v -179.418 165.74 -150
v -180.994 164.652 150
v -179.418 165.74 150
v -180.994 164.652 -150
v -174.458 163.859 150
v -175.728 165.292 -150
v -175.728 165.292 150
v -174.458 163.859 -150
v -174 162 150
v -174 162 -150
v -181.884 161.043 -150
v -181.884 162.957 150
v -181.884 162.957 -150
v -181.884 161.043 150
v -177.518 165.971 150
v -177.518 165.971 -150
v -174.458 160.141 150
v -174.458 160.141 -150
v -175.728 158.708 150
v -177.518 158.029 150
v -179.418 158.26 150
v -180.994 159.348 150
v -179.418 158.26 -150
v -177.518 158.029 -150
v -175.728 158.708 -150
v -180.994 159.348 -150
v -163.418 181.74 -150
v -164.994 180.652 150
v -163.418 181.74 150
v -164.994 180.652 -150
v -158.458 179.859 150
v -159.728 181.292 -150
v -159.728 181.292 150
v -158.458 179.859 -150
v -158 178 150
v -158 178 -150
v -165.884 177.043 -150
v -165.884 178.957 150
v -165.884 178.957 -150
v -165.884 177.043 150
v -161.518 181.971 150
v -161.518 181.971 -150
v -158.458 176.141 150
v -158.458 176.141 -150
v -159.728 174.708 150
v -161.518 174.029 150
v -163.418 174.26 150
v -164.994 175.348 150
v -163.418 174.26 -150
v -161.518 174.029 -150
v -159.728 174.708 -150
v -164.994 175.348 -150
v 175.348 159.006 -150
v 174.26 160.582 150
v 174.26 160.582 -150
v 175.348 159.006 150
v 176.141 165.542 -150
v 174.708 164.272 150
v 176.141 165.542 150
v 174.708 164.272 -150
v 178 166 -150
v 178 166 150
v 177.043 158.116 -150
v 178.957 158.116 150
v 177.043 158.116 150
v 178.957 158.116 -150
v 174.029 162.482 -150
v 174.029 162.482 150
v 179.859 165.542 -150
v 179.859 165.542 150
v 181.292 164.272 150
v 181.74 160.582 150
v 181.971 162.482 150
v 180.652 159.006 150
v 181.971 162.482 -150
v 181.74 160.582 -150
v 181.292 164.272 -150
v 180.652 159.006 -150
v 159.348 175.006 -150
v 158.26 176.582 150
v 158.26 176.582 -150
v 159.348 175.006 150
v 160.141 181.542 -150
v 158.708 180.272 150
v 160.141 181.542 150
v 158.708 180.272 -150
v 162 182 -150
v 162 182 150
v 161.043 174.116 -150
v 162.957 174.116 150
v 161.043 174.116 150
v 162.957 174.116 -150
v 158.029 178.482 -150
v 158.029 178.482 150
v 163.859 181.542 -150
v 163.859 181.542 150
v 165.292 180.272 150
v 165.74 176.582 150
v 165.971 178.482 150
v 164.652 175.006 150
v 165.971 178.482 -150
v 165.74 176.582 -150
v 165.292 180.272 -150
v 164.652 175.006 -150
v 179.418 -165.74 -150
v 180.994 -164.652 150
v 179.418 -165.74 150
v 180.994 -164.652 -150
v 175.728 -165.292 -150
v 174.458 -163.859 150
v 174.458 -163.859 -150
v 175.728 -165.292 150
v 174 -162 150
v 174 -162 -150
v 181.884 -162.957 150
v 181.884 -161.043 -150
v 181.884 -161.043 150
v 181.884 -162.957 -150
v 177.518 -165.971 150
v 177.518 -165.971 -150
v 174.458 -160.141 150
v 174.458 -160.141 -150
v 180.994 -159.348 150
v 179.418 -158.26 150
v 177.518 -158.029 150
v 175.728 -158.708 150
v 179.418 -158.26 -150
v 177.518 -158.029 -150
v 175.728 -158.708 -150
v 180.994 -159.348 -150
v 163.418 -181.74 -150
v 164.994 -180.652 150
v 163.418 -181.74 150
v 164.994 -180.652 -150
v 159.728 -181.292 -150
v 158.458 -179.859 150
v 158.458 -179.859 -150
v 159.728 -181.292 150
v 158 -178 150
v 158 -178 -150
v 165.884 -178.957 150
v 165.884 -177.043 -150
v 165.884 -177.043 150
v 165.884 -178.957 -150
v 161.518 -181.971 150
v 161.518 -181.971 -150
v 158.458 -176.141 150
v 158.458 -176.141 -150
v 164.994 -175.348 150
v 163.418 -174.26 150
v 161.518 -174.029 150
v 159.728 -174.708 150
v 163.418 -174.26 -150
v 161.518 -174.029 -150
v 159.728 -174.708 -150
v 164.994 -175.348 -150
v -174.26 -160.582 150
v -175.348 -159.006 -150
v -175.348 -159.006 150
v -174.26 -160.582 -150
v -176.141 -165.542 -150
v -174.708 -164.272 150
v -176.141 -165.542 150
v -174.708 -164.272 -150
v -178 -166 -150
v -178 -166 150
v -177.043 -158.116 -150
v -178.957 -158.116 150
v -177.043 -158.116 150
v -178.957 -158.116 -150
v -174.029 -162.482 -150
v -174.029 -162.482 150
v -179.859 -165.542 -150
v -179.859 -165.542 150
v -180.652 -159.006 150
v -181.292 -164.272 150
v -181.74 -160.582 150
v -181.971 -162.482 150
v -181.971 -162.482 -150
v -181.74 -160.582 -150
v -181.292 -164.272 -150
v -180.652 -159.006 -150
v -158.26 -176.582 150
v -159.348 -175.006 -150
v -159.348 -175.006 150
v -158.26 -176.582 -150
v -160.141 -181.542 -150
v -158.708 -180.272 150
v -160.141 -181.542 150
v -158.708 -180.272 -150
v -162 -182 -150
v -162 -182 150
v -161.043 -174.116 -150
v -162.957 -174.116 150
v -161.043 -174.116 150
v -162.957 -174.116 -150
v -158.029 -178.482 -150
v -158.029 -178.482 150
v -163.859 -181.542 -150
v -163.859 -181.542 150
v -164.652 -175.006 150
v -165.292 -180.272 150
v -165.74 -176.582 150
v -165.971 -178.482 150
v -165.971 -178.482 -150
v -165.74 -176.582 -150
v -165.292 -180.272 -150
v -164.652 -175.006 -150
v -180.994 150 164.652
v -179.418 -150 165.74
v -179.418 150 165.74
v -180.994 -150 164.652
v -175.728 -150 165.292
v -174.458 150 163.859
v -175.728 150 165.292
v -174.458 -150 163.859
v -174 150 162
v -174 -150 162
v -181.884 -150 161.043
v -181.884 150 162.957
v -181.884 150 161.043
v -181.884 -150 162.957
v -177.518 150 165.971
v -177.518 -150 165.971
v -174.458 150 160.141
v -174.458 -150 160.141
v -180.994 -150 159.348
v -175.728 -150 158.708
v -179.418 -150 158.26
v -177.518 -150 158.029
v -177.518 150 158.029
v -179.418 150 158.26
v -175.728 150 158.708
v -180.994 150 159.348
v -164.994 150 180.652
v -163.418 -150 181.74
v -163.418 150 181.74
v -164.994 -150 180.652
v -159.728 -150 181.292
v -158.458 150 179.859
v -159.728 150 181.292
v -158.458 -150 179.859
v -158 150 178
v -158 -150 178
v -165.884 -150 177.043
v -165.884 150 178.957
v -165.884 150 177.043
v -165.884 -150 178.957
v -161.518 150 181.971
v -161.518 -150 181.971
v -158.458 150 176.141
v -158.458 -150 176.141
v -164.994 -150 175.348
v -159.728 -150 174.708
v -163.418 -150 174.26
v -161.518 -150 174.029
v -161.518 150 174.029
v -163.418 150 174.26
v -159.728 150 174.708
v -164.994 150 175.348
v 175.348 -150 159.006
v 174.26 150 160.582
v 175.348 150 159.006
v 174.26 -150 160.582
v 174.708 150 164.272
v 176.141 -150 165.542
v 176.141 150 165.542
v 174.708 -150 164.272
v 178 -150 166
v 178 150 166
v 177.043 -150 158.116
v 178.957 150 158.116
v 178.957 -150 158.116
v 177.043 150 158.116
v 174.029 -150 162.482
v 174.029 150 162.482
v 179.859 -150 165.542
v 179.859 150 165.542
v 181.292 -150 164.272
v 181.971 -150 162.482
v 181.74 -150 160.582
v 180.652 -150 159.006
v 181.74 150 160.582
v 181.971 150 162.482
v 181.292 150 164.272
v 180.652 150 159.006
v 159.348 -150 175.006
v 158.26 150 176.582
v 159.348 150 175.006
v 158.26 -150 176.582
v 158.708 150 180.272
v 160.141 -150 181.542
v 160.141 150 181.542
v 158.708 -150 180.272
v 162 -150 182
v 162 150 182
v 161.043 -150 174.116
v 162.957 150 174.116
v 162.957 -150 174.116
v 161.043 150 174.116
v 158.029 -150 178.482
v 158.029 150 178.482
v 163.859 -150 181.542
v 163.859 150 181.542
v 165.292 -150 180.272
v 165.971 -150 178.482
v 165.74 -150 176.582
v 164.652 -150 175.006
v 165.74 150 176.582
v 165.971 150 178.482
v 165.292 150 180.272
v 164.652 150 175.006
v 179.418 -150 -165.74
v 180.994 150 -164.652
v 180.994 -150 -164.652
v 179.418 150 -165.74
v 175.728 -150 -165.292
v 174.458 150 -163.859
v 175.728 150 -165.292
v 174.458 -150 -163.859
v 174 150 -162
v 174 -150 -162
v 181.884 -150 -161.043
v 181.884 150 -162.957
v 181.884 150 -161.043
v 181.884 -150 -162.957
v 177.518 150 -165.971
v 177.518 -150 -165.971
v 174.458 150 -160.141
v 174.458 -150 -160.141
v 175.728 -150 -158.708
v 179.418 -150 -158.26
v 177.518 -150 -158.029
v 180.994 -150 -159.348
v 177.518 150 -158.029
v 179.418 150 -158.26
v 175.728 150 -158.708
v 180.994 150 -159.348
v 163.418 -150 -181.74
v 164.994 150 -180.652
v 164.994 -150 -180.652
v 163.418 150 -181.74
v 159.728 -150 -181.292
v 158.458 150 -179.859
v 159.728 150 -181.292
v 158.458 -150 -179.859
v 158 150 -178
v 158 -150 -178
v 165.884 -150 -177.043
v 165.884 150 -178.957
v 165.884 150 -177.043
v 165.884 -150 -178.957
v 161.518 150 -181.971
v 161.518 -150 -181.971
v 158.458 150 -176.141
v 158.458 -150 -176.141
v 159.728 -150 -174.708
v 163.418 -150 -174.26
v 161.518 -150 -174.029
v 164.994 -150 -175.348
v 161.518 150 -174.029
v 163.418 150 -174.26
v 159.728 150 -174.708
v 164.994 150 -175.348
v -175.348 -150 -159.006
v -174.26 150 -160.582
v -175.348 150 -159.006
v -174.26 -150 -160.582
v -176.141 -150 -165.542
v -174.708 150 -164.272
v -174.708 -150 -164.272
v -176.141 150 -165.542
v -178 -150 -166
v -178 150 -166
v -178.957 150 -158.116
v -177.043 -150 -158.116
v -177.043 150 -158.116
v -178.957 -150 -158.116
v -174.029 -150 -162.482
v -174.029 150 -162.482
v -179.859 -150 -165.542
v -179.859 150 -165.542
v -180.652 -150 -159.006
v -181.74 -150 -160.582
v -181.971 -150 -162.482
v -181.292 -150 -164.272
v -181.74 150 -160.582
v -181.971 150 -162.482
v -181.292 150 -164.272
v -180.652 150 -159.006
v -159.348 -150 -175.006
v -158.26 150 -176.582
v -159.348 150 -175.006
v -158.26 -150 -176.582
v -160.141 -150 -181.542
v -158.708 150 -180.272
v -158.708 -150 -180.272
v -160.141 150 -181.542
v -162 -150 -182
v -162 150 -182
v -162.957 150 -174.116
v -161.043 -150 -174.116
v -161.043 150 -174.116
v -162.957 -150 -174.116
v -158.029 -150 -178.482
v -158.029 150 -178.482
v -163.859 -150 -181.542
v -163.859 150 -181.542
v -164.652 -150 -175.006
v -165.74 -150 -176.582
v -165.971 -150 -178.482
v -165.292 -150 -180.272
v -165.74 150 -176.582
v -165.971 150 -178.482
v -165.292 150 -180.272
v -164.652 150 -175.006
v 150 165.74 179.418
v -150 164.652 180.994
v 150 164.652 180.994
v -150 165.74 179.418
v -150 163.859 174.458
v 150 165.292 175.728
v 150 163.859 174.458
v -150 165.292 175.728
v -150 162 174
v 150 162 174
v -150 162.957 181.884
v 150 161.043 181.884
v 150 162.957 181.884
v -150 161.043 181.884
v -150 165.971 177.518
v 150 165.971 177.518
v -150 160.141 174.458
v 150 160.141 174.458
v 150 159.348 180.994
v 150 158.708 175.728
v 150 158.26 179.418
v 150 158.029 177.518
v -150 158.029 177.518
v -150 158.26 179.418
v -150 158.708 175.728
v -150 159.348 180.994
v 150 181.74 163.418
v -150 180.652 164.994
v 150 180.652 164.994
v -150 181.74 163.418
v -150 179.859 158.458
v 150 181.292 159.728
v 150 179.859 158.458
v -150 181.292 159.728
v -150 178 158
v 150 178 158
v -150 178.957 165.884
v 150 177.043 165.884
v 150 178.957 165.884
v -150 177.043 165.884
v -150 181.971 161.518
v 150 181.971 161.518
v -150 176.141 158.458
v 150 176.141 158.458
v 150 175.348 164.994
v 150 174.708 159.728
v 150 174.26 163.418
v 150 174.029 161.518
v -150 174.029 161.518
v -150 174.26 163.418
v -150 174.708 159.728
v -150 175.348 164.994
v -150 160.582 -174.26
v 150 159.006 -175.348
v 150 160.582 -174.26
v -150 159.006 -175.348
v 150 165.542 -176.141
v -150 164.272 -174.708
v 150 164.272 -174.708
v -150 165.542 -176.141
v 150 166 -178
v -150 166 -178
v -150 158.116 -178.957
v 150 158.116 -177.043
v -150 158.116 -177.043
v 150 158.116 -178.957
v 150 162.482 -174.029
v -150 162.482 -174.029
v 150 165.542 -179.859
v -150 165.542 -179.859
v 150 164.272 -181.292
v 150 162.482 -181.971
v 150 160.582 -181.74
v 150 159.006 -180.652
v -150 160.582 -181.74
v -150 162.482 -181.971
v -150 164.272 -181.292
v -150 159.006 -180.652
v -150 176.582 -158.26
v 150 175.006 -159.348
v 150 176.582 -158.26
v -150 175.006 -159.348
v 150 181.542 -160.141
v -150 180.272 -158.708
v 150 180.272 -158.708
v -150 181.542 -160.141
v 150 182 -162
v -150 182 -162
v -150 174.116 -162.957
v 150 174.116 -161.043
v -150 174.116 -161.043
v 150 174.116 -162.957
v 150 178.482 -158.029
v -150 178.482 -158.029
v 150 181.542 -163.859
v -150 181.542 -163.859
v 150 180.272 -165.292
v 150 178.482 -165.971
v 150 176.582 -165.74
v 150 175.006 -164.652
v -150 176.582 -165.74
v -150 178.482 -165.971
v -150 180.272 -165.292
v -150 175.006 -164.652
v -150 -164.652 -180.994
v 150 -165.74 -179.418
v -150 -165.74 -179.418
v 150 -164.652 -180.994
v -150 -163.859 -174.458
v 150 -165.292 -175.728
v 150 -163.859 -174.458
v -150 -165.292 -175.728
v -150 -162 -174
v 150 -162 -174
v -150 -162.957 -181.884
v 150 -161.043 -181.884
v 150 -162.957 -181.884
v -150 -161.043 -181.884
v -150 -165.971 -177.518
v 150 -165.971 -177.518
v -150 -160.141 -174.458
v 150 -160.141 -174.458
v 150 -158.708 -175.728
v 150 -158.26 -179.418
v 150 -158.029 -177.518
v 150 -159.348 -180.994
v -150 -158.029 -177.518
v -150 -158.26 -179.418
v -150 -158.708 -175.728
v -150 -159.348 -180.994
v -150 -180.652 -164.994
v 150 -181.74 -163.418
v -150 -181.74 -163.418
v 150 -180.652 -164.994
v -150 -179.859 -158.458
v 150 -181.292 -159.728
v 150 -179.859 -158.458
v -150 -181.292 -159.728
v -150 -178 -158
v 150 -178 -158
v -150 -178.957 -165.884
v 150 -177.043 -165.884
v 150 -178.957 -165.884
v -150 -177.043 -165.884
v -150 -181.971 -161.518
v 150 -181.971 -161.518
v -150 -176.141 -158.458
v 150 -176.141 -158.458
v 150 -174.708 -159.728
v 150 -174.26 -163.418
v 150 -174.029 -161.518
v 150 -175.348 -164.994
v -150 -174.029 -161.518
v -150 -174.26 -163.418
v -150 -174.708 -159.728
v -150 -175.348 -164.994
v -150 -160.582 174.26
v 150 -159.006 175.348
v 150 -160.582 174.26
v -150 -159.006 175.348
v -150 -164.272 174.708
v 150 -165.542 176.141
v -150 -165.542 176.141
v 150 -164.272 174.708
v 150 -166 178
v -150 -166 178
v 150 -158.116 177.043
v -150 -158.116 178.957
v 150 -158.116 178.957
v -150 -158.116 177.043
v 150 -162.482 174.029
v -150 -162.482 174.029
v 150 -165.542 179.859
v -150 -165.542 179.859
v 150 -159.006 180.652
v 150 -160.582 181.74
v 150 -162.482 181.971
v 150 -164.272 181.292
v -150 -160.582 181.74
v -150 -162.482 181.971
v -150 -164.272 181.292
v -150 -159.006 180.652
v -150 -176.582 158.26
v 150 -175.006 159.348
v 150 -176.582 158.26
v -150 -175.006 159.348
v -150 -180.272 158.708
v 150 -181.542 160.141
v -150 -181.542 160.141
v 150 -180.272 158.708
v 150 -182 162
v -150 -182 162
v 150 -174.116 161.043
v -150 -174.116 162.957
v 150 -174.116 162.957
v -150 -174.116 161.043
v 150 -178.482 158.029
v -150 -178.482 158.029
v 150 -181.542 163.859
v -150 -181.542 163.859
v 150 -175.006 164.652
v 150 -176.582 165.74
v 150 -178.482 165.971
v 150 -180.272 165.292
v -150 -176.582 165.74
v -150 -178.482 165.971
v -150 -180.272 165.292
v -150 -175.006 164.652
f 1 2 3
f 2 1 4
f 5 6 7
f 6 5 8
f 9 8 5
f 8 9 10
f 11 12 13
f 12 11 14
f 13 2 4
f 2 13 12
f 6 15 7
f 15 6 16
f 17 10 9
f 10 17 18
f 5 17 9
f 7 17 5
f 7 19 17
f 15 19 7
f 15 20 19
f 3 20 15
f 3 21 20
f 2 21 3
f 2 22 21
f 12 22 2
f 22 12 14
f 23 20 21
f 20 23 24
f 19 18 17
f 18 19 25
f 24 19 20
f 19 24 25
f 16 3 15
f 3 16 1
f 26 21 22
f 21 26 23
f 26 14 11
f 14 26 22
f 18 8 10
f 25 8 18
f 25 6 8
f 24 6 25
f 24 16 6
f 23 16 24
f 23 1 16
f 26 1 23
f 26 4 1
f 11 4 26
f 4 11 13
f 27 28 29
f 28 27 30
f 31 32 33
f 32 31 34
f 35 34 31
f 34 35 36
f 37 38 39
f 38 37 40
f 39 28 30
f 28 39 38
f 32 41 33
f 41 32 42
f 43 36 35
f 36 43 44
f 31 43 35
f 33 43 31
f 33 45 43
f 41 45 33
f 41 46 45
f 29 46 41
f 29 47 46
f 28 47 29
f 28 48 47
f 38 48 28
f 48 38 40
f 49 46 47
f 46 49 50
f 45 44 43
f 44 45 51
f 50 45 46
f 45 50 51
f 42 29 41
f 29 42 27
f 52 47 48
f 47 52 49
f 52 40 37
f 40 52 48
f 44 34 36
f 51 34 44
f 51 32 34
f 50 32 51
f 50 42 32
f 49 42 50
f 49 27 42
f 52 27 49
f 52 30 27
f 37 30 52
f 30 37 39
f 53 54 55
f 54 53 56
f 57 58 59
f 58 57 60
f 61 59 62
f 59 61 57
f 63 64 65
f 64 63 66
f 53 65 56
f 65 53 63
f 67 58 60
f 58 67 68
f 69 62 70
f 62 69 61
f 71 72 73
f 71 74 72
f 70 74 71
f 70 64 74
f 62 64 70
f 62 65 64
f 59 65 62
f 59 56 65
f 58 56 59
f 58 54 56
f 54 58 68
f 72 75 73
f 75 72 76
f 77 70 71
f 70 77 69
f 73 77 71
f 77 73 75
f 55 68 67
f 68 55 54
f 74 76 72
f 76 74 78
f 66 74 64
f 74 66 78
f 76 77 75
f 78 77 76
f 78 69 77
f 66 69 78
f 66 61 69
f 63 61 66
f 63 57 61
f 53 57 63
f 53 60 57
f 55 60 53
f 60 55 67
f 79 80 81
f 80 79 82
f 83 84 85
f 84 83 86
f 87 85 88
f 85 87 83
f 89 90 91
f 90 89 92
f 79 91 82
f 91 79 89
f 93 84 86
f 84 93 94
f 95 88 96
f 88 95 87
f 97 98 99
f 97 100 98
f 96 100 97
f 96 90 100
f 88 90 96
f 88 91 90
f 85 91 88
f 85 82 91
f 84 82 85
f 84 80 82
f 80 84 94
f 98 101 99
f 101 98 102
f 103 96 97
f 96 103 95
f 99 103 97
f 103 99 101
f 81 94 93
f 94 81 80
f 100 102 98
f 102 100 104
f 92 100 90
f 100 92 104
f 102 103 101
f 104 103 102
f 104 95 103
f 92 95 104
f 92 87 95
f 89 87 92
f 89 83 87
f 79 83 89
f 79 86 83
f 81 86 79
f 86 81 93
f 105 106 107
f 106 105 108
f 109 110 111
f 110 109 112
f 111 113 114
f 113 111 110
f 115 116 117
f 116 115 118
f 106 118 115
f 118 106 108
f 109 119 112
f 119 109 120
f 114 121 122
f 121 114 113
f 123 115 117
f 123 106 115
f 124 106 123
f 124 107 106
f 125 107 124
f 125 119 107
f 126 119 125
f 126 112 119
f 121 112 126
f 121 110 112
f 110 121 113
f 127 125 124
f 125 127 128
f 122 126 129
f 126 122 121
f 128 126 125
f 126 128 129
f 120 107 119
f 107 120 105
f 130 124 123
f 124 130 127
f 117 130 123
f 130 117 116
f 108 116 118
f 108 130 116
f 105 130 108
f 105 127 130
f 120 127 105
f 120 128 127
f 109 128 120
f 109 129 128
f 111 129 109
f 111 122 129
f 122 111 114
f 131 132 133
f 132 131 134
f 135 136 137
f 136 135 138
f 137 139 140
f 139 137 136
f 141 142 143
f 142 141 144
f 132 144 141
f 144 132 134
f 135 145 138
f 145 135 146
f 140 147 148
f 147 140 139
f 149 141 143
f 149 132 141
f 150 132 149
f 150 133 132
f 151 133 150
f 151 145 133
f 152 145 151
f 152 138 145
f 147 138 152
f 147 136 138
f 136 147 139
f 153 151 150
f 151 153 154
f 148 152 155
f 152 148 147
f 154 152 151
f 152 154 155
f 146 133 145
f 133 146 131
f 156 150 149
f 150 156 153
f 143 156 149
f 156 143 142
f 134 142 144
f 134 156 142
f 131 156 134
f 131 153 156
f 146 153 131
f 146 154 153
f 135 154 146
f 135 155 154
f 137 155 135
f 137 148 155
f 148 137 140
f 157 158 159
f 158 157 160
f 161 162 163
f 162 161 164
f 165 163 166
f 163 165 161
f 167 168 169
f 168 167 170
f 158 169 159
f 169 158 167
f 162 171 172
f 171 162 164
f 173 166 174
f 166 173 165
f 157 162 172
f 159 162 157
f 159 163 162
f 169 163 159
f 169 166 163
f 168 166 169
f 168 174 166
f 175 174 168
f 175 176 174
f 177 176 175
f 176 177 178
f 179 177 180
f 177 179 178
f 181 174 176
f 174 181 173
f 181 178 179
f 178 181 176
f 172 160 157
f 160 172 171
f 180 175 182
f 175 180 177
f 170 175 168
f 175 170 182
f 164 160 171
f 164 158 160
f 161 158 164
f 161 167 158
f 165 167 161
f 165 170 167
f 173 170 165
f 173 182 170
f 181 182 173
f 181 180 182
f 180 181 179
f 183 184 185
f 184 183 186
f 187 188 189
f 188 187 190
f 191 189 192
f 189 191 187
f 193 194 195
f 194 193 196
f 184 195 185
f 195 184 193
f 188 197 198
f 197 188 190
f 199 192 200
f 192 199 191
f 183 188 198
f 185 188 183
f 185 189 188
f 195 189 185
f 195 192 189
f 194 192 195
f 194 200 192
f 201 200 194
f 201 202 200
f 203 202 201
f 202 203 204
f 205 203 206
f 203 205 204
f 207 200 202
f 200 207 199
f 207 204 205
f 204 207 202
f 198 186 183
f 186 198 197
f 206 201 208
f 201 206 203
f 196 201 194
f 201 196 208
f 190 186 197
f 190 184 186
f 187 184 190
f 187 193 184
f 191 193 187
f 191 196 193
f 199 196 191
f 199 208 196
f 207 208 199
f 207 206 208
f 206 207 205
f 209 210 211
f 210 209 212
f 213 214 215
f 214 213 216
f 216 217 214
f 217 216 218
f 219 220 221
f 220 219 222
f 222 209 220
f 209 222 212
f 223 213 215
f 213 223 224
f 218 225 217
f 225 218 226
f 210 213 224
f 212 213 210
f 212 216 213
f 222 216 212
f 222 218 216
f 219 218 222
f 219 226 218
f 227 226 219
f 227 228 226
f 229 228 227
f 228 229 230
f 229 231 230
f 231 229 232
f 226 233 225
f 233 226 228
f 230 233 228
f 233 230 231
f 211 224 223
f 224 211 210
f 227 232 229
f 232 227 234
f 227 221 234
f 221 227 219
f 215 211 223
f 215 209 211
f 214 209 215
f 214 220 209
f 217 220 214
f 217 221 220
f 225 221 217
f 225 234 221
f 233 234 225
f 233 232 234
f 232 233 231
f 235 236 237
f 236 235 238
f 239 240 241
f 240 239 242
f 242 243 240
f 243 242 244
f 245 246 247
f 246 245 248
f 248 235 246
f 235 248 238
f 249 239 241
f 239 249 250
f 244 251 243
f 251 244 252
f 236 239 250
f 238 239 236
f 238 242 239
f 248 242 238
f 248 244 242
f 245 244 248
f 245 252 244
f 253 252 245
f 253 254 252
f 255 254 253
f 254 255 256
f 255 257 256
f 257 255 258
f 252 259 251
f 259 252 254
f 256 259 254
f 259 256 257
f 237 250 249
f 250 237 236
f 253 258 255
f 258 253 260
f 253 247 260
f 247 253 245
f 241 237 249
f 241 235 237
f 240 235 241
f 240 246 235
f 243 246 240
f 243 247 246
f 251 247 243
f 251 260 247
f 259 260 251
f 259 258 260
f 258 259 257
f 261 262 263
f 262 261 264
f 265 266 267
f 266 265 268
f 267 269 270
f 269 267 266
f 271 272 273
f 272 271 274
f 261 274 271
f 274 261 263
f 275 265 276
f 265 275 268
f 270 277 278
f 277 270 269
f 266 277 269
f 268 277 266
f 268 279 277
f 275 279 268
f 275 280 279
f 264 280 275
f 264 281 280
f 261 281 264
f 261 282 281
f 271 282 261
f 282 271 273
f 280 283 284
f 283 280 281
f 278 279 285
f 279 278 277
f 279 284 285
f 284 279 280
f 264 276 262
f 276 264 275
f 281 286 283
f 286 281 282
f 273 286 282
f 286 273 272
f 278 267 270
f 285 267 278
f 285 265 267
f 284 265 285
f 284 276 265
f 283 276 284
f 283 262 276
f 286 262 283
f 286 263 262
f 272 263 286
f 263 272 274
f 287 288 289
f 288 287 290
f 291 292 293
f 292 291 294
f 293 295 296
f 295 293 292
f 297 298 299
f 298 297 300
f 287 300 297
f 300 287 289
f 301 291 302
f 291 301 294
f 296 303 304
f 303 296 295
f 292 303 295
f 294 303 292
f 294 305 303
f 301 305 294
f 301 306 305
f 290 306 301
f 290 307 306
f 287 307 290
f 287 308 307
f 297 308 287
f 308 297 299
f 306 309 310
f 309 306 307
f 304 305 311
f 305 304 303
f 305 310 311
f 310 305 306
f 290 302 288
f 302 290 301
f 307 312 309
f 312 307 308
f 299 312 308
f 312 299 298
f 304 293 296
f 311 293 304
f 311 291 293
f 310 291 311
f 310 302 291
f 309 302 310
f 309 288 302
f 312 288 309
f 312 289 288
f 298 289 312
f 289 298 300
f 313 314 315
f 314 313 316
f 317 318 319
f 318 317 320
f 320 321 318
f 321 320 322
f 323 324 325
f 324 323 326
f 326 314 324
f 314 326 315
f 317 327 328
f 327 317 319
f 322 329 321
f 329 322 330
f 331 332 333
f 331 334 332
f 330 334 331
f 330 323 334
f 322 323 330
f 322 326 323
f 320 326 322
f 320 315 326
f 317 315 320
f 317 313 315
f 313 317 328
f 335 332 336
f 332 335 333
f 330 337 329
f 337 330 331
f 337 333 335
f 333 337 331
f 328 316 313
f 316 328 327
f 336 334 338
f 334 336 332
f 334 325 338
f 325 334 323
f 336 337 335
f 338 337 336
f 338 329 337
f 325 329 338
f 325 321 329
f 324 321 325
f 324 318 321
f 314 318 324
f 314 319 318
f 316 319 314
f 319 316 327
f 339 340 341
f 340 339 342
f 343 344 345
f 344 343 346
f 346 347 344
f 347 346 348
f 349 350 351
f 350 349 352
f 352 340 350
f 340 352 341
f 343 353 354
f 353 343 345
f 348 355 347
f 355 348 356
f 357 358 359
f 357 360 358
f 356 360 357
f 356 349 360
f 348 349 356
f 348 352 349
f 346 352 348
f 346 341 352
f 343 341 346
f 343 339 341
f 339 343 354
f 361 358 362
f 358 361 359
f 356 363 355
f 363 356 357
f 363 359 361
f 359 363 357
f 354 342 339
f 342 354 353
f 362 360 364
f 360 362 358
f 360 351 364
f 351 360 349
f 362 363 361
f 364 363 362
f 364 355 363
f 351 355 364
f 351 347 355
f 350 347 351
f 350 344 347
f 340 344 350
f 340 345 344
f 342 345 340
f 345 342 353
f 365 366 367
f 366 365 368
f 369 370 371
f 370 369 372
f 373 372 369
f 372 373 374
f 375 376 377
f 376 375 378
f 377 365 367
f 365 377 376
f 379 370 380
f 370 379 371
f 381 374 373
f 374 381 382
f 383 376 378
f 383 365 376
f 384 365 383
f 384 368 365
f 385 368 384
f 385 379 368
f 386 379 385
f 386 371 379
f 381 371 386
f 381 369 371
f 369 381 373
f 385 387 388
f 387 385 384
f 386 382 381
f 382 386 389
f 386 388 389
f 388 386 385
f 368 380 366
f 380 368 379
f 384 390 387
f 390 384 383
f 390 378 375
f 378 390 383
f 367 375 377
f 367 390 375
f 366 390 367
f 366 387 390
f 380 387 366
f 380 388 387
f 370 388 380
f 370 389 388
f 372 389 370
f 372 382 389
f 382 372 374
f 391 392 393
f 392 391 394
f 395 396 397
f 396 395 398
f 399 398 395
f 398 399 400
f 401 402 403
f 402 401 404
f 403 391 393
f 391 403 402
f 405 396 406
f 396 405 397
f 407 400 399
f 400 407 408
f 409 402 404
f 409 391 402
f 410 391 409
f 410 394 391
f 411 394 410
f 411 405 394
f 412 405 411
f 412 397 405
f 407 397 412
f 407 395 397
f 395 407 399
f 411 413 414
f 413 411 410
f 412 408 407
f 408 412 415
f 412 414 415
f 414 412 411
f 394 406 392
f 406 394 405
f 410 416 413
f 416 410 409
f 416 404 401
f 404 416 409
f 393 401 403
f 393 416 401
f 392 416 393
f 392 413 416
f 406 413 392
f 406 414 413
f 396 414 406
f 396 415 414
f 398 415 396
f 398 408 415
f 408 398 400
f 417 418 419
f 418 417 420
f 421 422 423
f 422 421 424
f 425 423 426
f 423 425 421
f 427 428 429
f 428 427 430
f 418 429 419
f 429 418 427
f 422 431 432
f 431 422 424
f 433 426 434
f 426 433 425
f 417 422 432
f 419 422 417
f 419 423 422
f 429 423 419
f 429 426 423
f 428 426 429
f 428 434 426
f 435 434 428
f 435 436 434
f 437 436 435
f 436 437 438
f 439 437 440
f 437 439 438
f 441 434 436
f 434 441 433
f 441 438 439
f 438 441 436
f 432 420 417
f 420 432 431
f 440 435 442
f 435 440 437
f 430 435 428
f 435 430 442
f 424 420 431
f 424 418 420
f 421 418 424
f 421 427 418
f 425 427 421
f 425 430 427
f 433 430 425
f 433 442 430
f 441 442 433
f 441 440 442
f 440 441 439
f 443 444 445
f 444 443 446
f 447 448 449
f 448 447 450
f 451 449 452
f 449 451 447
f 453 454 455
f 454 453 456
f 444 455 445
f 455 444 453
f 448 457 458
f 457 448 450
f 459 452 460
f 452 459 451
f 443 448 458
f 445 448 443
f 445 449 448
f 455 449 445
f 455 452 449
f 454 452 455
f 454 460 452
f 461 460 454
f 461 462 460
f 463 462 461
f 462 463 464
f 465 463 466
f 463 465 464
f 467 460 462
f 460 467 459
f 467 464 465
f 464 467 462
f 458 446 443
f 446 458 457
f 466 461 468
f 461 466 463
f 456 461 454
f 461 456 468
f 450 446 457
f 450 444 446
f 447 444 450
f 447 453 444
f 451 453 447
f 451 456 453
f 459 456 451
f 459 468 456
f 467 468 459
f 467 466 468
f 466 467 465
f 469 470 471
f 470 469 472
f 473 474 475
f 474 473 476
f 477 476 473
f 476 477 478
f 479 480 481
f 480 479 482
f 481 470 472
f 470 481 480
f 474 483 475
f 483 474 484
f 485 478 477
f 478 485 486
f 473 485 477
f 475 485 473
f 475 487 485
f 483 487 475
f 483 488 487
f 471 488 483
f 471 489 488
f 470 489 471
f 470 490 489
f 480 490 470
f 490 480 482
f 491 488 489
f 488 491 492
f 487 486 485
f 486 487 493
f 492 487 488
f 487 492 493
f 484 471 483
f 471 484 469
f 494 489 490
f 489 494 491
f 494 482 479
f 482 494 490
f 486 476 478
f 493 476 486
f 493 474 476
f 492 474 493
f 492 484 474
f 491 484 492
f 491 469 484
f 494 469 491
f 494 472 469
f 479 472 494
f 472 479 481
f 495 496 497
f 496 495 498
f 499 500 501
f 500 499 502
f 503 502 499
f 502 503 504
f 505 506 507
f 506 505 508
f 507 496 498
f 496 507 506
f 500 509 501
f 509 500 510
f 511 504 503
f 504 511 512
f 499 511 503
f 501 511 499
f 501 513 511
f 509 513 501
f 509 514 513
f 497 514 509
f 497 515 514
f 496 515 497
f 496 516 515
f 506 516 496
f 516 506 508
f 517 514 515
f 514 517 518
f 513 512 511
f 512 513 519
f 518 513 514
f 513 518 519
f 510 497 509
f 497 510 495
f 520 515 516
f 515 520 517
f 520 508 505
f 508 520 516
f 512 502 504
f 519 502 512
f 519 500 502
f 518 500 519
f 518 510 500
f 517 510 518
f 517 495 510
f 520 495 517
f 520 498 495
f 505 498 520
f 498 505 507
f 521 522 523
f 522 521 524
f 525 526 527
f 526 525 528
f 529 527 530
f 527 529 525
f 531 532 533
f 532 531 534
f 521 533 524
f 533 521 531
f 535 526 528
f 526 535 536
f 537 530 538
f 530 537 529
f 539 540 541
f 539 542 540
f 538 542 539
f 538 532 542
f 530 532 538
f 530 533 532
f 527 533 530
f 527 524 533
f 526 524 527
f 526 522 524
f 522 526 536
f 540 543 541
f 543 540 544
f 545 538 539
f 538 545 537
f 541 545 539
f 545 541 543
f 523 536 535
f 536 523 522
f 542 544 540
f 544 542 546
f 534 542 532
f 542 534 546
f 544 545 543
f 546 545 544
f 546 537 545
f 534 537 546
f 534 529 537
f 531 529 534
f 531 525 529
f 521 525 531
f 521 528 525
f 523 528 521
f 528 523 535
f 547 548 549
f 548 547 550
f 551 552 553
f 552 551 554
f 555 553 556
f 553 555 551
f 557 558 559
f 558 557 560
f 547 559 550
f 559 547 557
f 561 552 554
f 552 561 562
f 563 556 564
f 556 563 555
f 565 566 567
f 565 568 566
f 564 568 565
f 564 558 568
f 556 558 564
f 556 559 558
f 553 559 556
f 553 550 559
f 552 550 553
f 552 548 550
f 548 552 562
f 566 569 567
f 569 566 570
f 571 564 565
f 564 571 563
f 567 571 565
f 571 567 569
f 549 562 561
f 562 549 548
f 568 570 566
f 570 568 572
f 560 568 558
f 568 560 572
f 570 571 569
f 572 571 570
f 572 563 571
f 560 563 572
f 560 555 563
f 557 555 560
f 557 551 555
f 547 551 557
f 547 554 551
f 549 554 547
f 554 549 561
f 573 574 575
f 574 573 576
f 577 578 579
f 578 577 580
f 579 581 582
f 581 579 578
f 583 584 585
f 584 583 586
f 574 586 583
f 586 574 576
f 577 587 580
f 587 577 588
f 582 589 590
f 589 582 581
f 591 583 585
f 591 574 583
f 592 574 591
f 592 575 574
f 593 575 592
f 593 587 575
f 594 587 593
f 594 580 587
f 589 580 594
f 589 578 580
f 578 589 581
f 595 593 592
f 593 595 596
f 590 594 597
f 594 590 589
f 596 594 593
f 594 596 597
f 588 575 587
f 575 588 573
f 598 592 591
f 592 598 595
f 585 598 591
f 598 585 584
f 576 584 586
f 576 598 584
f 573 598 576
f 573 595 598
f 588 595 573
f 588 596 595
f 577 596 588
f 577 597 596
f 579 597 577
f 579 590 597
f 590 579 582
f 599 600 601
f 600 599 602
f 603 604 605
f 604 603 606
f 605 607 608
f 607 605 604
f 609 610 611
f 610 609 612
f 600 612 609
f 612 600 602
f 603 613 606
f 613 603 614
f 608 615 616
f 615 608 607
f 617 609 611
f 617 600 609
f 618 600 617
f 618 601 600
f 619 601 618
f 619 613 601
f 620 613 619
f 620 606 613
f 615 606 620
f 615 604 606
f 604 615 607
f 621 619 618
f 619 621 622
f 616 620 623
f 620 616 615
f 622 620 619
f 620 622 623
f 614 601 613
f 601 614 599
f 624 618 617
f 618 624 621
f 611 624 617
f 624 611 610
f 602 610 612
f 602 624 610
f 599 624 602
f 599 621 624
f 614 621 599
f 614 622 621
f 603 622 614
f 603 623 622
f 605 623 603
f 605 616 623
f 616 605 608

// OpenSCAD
rodr = 4;
rodl = 300;

module edge(radius=rodr, length=rodl) {
  translate([-radius*2,-radius*2,-length/2]) cylinder(r=radius, h=length);
  translate([radius*2,radius*2,-length/2]) cylinder(r=radius, h=length);
}

module parallel(radius, length) {
  offset = 20;
  distance = length/2 + offset;
  translate([-distance,offset,0]) edge(radius, length);
  translate([distance,offset,0]) rotate([0,0,90]) edge(radius, length);
}

module four() {
  translate([0, rodl/2, 0]) parallel(rodr, rodl);
  translate([0, -rodl/2, 0]) rotate([0,0,180]) parallel(rodr, rodl);
}

module rods() {
  four();
  rotate([90,0,0]) four();
  rotate([0,90,0]) four();
}

module rod_corner() {
  translate([0,0,170]) edge(rodr, rodl);
  rotate([0, -90, 0]) translate([0,0,-170]) edge(rodr, rodl);
  rotate([-90, 0, 0]) translate([0,0,-170]) edge(rodr, rodl);
}

rods();
